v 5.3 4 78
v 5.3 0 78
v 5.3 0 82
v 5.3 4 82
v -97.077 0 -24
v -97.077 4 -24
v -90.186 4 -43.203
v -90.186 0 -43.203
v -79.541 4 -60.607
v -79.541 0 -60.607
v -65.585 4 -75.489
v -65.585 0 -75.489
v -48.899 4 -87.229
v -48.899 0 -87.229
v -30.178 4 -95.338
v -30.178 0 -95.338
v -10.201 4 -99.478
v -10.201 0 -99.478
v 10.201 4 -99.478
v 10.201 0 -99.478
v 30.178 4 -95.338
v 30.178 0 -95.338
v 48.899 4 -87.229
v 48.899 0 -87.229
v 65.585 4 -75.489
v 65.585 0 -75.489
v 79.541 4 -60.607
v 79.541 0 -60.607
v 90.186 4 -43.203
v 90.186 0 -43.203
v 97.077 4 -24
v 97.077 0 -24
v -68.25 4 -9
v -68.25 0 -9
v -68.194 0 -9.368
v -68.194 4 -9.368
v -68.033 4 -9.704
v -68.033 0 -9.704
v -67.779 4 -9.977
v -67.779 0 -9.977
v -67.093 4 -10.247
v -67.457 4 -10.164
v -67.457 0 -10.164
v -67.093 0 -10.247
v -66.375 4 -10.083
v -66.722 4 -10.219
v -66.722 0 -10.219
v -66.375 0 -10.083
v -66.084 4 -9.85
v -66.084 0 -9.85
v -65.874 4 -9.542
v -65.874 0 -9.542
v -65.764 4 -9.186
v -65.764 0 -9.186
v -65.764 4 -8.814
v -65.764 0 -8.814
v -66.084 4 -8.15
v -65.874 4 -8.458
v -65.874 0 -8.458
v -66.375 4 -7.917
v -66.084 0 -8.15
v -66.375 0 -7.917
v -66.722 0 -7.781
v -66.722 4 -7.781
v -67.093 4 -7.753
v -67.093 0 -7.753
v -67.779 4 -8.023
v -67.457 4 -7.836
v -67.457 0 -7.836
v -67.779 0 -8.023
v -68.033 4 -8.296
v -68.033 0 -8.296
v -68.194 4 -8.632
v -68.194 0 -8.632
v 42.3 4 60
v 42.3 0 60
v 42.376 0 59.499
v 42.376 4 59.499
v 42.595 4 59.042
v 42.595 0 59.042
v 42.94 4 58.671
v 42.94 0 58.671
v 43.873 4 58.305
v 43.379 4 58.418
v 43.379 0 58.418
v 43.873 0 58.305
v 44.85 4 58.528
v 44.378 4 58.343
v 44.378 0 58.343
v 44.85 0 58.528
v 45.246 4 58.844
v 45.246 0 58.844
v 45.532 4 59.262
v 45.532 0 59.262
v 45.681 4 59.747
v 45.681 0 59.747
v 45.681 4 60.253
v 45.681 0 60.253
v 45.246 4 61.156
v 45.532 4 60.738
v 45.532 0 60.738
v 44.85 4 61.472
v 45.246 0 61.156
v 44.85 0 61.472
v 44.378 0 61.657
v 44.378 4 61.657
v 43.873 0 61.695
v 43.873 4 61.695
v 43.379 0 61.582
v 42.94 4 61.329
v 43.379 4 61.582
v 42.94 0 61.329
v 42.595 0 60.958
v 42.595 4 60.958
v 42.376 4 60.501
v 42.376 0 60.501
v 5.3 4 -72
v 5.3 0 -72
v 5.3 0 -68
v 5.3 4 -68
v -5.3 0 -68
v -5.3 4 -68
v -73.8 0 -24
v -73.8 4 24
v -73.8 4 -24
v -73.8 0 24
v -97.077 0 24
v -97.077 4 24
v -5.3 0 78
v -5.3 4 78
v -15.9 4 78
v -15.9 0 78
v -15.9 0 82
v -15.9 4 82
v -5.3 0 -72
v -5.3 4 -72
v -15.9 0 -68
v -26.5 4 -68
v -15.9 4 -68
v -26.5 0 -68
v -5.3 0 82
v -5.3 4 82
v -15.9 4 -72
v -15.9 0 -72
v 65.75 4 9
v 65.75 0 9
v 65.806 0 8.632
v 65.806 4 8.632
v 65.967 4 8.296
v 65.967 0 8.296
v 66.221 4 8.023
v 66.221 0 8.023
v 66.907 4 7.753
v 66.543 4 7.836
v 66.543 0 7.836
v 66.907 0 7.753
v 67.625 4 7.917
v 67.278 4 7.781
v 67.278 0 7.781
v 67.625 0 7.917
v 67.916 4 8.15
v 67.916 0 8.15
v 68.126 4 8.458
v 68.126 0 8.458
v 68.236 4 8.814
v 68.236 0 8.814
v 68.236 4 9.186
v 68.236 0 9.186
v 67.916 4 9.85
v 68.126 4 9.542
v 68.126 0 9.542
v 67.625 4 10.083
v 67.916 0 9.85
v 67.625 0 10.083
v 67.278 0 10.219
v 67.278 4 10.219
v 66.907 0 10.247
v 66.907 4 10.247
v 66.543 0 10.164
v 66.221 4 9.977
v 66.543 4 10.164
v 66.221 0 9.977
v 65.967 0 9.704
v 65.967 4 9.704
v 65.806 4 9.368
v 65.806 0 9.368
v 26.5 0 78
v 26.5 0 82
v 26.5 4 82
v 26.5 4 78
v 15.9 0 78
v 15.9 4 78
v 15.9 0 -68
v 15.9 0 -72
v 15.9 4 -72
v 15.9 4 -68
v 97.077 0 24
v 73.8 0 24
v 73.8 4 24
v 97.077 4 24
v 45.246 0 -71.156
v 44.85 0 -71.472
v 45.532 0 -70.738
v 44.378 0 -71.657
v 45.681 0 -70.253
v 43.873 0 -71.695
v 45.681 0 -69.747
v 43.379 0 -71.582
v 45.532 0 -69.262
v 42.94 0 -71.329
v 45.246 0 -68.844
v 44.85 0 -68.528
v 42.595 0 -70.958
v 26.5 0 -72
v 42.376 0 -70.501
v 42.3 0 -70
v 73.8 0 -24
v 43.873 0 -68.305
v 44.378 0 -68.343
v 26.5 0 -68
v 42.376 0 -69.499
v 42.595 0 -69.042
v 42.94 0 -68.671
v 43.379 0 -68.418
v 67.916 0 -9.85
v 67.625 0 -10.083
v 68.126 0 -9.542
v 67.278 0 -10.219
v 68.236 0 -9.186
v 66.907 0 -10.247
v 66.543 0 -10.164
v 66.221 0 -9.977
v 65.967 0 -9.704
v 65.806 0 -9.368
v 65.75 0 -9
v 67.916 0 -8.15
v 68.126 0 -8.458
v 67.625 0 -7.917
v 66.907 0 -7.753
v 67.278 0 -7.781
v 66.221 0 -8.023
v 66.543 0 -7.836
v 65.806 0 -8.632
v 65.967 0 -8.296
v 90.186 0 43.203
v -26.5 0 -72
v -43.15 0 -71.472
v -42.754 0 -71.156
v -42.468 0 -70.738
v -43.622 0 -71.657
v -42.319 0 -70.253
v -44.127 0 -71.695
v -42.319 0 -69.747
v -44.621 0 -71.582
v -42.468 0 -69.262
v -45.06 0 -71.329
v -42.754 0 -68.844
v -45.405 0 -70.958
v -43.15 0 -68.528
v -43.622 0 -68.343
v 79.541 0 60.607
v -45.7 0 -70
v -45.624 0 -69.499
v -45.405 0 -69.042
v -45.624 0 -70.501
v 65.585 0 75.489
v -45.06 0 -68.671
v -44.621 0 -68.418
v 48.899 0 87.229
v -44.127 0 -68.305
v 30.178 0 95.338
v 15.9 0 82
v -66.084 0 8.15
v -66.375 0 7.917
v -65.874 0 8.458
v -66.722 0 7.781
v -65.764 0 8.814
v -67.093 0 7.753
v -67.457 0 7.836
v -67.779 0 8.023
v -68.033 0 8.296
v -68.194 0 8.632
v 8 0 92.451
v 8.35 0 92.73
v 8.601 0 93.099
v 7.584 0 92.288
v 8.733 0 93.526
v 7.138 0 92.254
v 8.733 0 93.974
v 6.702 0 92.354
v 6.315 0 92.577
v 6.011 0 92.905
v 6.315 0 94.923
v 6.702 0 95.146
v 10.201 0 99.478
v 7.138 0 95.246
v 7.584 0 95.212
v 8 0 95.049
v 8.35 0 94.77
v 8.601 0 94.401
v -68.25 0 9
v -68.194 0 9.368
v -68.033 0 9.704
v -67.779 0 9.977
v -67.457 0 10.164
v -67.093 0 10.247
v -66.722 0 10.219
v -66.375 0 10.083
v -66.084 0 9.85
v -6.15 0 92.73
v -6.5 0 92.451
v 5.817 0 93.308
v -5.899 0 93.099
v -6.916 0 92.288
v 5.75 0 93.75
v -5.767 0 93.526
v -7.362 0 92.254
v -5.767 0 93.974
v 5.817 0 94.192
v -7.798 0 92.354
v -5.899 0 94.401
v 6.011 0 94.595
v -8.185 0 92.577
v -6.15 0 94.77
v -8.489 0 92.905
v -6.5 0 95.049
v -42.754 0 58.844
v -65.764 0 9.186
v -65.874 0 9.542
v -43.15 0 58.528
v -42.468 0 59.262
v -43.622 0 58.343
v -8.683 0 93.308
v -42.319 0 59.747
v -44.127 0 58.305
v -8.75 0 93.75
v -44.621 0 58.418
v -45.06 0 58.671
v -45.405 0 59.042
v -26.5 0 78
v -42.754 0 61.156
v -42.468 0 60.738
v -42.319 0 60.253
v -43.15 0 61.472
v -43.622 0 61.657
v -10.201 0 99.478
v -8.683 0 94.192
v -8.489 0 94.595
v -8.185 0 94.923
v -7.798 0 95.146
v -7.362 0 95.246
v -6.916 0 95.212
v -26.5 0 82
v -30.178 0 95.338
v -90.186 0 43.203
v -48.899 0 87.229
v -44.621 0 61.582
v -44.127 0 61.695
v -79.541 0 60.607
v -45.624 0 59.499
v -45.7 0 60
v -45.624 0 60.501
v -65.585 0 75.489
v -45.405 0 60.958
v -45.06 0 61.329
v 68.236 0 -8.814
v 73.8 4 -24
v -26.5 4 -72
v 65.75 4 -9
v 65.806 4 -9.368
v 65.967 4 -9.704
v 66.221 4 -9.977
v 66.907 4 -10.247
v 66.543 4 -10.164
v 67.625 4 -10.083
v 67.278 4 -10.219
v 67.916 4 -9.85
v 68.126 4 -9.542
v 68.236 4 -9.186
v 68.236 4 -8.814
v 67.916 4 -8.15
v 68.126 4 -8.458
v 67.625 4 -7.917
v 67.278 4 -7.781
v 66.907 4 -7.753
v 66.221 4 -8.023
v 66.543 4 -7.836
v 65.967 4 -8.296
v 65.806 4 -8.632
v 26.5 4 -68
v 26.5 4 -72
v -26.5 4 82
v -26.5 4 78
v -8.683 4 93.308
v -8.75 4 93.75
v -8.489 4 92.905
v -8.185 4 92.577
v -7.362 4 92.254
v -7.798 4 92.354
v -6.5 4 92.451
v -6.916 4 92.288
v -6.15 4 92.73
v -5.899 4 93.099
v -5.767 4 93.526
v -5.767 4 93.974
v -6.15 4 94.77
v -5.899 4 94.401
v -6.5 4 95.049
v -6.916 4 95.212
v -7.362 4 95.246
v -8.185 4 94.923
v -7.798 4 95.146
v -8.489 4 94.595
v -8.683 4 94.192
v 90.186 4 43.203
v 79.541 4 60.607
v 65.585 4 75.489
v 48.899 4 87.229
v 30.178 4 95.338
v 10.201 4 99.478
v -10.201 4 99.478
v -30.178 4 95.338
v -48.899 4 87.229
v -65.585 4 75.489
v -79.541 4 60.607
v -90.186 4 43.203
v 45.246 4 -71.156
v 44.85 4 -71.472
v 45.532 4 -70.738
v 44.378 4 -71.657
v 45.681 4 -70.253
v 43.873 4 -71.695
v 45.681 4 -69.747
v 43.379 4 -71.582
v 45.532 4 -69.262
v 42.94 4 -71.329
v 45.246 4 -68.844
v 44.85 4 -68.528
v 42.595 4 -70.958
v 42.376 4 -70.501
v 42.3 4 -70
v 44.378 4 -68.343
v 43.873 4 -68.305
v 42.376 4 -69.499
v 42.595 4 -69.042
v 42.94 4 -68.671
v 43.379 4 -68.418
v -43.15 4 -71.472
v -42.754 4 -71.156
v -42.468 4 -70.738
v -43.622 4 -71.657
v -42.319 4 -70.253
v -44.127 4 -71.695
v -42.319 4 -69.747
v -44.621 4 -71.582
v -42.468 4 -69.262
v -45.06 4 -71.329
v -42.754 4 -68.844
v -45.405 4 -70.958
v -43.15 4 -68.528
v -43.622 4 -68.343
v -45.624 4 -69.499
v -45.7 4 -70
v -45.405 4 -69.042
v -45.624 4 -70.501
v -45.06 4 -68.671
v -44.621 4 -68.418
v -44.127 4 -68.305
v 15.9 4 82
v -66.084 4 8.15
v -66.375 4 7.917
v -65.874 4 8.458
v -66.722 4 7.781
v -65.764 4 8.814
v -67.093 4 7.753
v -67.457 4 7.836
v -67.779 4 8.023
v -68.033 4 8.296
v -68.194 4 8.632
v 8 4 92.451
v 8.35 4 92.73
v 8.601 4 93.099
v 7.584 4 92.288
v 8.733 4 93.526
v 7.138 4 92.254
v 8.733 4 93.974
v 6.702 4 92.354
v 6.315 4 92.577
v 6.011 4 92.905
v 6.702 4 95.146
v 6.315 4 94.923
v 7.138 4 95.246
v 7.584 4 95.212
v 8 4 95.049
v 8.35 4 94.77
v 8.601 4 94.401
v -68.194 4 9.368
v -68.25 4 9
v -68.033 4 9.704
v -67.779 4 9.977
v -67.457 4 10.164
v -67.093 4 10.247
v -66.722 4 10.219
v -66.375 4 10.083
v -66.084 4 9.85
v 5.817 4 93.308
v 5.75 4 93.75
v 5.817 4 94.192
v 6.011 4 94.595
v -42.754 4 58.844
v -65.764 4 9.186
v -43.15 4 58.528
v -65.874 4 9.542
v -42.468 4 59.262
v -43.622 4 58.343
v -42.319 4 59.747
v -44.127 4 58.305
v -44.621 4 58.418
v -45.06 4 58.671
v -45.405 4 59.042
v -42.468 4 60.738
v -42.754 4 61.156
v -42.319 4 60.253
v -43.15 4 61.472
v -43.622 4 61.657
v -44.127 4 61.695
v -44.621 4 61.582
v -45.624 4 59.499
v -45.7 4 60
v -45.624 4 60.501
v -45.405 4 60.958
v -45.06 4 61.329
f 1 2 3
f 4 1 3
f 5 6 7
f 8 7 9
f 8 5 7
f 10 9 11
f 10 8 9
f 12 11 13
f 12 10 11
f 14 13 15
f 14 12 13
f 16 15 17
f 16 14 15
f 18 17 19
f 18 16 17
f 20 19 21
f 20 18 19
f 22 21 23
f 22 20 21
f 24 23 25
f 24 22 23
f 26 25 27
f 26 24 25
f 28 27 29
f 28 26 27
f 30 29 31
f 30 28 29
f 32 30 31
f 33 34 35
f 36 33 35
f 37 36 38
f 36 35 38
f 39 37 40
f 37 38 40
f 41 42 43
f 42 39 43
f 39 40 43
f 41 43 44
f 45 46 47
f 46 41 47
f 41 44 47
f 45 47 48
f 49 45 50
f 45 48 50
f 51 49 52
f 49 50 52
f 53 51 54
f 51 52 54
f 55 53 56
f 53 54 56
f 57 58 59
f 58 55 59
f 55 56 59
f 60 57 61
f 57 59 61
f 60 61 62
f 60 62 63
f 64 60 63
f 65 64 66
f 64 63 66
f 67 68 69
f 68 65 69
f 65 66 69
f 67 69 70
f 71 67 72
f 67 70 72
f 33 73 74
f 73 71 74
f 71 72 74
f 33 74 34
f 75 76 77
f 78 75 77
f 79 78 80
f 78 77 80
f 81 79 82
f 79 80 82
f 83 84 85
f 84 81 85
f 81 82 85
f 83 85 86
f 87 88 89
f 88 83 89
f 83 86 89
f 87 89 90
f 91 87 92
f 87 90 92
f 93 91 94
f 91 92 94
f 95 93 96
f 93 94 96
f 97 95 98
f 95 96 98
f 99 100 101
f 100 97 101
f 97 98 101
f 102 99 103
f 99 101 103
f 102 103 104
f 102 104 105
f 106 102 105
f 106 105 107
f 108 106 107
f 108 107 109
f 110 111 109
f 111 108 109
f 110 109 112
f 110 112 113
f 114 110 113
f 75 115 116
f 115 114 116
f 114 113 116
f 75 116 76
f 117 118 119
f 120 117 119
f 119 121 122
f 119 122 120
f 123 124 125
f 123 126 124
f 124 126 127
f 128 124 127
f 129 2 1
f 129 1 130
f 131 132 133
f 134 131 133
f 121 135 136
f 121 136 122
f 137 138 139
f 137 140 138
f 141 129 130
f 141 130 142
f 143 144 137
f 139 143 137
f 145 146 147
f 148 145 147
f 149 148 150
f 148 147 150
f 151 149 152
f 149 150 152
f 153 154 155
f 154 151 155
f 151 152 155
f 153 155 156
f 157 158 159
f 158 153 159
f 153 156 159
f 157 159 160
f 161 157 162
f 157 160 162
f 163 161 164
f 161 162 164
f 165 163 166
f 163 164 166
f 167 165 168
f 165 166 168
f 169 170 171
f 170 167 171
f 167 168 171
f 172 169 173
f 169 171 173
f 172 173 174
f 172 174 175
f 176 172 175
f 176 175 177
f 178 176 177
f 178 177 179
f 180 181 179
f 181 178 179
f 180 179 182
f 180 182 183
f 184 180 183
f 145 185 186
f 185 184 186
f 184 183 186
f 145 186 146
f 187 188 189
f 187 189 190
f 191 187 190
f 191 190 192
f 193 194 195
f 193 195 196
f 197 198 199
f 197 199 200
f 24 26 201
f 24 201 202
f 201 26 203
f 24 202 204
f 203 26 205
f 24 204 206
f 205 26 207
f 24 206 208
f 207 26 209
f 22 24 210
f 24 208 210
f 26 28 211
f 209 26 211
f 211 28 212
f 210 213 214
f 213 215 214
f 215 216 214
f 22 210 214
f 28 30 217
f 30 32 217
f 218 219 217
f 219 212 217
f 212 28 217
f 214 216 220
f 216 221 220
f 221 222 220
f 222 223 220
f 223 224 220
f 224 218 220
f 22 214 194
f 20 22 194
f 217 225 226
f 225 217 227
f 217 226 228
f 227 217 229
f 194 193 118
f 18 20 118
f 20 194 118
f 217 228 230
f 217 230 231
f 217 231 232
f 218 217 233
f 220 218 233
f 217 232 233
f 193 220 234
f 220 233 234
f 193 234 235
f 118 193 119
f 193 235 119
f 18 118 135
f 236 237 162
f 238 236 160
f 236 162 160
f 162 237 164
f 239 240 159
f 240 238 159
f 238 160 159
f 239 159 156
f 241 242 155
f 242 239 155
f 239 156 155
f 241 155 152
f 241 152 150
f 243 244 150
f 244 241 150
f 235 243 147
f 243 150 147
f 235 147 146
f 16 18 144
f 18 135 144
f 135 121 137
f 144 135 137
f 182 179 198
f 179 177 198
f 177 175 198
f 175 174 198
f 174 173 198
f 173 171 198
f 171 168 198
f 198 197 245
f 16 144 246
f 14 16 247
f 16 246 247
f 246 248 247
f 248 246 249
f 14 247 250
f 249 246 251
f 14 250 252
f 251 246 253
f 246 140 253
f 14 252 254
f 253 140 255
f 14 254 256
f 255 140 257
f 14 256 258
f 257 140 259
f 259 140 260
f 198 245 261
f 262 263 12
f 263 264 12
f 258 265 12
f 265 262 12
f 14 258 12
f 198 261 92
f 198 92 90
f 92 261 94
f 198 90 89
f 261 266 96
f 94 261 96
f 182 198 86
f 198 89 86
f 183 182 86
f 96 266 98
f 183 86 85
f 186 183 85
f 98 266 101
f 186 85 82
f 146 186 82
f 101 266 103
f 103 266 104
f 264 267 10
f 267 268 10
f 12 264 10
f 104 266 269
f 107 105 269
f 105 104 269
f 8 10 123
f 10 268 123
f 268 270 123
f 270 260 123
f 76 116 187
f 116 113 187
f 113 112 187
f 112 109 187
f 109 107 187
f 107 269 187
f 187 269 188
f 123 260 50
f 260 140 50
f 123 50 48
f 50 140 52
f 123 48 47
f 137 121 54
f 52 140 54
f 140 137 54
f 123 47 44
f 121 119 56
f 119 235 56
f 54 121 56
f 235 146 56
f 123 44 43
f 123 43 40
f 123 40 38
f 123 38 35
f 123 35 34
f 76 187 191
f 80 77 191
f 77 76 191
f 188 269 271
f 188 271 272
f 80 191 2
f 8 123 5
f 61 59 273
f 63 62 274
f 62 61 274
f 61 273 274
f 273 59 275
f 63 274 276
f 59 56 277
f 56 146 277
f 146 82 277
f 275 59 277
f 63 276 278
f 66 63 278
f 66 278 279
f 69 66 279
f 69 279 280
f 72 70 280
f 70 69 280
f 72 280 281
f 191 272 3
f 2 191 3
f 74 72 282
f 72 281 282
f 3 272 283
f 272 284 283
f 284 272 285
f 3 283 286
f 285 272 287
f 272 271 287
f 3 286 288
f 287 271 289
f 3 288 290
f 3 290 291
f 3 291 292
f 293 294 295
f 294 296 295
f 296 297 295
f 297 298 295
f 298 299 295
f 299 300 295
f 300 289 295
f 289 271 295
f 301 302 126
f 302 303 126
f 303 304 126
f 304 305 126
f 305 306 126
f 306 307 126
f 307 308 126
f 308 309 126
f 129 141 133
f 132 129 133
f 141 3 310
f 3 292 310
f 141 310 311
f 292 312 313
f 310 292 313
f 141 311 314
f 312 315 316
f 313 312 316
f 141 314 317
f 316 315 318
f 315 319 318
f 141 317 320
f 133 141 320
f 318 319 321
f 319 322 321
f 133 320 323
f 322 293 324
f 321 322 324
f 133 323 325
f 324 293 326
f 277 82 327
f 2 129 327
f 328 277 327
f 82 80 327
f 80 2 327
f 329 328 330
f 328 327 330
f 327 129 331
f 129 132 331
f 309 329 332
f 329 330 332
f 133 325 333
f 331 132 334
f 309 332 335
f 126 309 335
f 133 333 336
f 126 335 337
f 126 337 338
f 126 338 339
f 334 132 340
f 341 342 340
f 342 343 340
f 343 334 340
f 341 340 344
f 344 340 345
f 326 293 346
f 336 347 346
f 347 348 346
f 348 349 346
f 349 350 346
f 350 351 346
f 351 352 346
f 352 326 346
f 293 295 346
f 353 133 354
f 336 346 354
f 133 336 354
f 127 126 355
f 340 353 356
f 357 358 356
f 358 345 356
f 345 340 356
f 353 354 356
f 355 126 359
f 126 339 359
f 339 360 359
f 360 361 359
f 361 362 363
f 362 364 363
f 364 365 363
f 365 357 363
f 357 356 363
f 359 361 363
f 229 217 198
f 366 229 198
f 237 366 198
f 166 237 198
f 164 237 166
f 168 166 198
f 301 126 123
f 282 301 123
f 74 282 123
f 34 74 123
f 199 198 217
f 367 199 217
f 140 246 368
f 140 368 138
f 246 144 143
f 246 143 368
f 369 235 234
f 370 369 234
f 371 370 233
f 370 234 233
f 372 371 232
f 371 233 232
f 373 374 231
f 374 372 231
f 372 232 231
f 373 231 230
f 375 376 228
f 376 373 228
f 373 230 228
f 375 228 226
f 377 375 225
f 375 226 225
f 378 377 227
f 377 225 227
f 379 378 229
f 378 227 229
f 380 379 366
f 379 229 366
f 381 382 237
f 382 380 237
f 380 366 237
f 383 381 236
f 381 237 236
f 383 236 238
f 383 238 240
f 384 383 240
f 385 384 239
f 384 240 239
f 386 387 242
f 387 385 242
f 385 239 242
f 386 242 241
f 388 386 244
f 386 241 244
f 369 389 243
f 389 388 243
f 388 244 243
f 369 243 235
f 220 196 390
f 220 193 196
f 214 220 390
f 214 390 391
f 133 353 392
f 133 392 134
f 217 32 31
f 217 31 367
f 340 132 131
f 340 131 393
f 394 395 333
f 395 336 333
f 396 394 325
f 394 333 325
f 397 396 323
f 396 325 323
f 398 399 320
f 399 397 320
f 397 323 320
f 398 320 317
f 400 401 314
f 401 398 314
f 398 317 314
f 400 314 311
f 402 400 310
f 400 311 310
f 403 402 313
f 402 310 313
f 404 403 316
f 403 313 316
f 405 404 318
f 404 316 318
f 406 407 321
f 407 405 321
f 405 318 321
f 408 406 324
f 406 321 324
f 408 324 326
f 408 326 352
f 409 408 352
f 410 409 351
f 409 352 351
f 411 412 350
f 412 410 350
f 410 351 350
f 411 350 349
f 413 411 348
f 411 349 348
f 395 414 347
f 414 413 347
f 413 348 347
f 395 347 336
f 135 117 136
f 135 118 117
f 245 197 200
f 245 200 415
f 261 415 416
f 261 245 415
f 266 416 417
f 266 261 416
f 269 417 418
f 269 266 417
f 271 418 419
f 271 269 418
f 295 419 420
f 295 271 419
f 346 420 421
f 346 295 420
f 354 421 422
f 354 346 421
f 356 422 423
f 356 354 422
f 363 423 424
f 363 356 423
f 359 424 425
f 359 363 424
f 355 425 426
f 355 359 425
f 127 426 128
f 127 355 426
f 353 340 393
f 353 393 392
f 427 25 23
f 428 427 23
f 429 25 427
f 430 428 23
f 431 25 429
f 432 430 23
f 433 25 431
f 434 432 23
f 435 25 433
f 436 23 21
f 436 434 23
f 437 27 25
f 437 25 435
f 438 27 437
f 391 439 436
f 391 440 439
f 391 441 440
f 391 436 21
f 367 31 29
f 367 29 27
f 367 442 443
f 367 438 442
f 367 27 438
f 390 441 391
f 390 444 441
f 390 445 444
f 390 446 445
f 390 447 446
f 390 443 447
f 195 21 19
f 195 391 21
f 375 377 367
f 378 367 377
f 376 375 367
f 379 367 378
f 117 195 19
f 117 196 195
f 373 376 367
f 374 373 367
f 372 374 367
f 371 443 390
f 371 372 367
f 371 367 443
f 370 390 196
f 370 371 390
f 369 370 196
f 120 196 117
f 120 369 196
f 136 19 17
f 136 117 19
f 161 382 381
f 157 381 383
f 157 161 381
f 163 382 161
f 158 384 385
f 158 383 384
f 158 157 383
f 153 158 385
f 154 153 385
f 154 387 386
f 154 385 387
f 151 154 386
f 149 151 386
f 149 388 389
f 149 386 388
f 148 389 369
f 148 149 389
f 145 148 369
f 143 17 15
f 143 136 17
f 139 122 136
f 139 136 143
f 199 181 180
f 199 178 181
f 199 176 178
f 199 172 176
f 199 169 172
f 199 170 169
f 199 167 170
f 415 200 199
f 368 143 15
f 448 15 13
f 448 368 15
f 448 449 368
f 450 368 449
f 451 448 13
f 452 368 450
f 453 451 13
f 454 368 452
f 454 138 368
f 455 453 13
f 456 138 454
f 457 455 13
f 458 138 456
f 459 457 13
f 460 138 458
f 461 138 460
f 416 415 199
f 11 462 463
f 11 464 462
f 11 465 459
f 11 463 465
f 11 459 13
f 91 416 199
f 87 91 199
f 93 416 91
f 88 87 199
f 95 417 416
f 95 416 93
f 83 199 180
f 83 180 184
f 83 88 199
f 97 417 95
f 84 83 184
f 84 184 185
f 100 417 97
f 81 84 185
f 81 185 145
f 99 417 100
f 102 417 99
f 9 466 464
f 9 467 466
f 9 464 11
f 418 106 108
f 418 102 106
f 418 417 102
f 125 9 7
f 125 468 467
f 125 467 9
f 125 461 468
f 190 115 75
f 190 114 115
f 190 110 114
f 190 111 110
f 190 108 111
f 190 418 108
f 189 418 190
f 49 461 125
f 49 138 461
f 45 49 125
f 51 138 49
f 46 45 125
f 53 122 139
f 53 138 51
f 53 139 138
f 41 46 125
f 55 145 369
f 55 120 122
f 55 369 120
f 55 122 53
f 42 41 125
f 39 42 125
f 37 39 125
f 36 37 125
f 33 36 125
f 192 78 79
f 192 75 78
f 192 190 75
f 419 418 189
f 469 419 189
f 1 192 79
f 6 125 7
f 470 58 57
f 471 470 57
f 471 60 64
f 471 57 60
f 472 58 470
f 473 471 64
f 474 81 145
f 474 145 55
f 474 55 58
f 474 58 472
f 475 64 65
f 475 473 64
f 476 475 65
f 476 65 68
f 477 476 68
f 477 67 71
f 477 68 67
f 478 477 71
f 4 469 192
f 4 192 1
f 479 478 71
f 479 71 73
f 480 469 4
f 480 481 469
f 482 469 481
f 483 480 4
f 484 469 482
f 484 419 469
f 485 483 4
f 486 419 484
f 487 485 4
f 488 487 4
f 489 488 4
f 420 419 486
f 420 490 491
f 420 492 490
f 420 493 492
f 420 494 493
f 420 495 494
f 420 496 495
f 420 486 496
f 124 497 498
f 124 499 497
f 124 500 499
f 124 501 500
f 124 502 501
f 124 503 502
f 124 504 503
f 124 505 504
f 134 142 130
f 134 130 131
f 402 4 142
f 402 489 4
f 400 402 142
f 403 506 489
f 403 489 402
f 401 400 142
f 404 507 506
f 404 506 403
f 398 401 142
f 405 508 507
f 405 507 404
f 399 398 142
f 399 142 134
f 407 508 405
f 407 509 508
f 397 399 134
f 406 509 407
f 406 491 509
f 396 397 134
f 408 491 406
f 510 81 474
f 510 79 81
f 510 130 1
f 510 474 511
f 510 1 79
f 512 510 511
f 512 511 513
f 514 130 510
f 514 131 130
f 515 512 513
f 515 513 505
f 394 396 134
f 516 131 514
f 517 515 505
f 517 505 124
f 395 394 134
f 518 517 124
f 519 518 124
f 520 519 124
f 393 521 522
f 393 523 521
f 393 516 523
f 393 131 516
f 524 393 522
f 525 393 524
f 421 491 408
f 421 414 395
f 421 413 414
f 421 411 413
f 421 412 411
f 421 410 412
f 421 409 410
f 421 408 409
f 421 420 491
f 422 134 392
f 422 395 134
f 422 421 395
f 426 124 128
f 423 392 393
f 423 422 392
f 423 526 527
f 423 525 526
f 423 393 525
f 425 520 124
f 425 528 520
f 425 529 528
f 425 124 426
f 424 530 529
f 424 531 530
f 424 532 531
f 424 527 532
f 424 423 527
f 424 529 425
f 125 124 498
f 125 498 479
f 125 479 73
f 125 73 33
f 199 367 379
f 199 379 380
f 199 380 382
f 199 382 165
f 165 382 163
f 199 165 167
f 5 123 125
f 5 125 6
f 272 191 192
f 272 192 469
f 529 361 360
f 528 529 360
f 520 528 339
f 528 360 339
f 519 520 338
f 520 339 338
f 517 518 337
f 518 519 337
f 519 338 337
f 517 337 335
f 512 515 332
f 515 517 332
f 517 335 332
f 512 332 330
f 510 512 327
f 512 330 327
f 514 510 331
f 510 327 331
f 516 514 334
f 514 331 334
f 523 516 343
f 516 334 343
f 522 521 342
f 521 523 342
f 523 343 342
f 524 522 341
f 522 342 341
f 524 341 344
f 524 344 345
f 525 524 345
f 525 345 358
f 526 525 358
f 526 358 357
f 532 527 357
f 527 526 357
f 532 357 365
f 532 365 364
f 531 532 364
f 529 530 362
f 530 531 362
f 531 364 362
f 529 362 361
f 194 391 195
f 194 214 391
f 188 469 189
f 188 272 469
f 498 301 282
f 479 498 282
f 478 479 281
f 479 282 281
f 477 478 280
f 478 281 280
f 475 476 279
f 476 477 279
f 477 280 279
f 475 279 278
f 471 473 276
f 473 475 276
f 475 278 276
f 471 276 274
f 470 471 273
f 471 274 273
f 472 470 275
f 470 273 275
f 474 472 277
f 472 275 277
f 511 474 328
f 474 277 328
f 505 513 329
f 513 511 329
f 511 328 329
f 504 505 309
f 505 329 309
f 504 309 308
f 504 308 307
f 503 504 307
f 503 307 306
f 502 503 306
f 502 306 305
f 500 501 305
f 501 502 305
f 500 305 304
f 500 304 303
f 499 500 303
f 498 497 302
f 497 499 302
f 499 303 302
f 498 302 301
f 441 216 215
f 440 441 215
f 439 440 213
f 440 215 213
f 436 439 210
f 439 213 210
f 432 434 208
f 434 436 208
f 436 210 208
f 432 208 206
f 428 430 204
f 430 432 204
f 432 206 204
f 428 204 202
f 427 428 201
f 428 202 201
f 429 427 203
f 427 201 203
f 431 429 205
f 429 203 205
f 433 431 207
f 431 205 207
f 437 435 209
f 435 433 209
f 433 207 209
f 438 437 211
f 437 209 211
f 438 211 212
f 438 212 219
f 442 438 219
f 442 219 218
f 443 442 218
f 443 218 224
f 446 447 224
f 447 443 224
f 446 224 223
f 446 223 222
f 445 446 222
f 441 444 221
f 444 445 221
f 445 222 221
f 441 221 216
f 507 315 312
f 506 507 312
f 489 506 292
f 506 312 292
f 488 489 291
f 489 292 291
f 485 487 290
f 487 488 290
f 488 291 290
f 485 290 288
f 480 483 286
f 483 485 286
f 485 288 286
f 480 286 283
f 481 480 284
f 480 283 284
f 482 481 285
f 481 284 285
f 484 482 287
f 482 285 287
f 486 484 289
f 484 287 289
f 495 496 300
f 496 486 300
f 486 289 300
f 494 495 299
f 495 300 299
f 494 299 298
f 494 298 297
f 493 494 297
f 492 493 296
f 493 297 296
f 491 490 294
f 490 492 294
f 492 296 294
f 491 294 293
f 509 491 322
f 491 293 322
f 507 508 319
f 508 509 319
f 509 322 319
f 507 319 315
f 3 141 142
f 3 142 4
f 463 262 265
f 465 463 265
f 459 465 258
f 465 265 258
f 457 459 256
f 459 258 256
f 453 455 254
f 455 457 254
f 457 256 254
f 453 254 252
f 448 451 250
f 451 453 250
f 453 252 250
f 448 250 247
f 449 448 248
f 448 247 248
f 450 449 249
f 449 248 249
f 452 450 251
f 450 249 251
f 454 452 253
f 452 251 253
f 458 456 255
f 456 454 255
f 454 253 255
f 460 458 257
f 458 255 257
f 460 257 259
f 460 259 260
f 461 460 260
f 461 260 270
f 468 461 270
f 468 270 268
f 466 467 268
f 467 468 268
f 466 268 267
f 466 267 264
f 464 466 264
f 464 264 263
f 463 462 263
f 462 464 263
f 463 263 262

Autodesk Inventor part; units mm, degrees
ref_plane "YZ Plane" through (0, 0, 0) normal (1, 0, 0) x (0, 1, 0)
ref_plane "XZ Plane" through (0, 0, 0) normal (0, 1, 0) x (-1, 0, 0)
ref_plane "XY Plane" through (0, 0, 0) normal (0, 0, 1) x (1, 0, 0)
sketch "Sketch1" plane through (0, 0, 0) normal (0, 1, 0) x (-1, 0, 0)
  circle A0 centre (0, 0) radius 100
  line L0 (0, -140) -> (0, 140) projected
  line L1 (-146.2506, 0) -> (146.2506, 0) projected
  circle A1 centre (7.25, 93.75) radius 1.5
  circle A2 centre (-7.25, 93.75) radius 1.5
  circle A3 centre (-44, 60) radius 1.7
  circle A4 centre (-44, -70) radius 1.7
  circle A5 centre (44, 60) radius 1.7
  circle A6 centre (44, -70) radius 1.7
  circle A7 centre (-67, 9) radius 1.25
  circle A8 centre (-67, -9) radius 1.25
  circle A9 centre (67, 9) radius 1.25
  circle A10 centre (67, -9) radius 1.25
  line L2 (-95.8, 24) -> (-73.8, 24)
  line L3 (-73.8, 24) -> (-73.8, -24)
  line L4 (-73.8, -24) -> (-95.8, -24)
  line L5 (-95.8, -24) -> (-95.8, 24)
  line L6 (-95.8, 24) -> (-104.4647, 24)
  line L7 (-104.4647, 24) -> (-104.4647, -24)
  line L8 (-104.4647, -24) -> (-95.8, -24)
  line L9 (-95.8, -24) -> (-95.8, 24)
  line L10 (95.8, 24) -> (73.8, 24)
  line L11 (73.8, 24) -> (73.8, -24)
  line L12 (73.8, -24) -> (95.8, -24)
  line L13 (95.8, -24) -> (95.8, 24)
  line L14 (95.8, 24) -> (104.4647, 24)
  line L15 (104.4647, 24) -> (104.4647, -24)
  line L16 (104.4647, -24) -> (95.8, -24)
  line L17 (95.8, -24) -> (95.8, 24)
  line L18 (-26.5, 78) -> (26.5, 78)
  line L19 (26.5, 78) -> (26.5, 82)
  line L20 (26.5, 82) -> (-26.5, 82)
  line L21 (-26.5, 82) -> (-26.5, 78)
  line L22 (-26.5, 78) -> (-15.9, 78)
  line L23 (-15.9, 78) -> (-15.9, 82)
  line L24 (-15.9, 82) -> (-26.5, 82)
  line L25 (-26.5, 82) -> (-26.5, 78)
  line L26 (-5.3, 78) -> (-5.3, 82)
  line L27 (5.3, 78) -> (5.3, 82)
  line L28 (15.9, 78) -> (15.9, 82)
  line L29 (-26.5, -72) -> (26.5, -72)
  line L30 (26.5, -68) -> (-26.5, -68)
  line L31 (15.9, -72) -> (15.9, -68)
  line L32 (26.5, -72) -> (26.5, -68)
  line L33 (5.3, -72) -> (5.3, -68)
  line L34 (-5.3, -72) -> (-5.3, -68)
  line L35 (-15.9, -72) -> (-15.9, -68)
  line L36 (-26.5, -68) -> (-26.5, -72)
  point P0 (97.0773, 24)
  point P1 (-97.0773, 24)
  point P2 (-97.0773, -24)
  point P3 (97.0773, -24)
  dimension "diam" = 200
  dimension "d3" = 7.25
  dimension "d4" = 7.25
  dimension "d5" = 93.75
  dimension "d6" = 93.75
  dimension "d7" = 3
  dimension "d8" = 3
  dimension "d9" = 60
  dimension "d10" = 3.4
  dimension "d13" = 130
  dimension "d16" = 88
  dimension "d19" = 44
  dimension "d20" = 67
  dimension "d21" = 9
  dimension "d22" = 2.5
  dimension "d25" = 18
  dimension "d28" = 134
  dimension "d31" = 95.8
  dimension "d32" = 24
  dimension "d33" = 22
  dimension "d34" = 48
  dimension "d35" = 78
  dimension "d36" = 26.5
  dimension "d37" = 53
  dimension "d38" = 4
  dimension "d39" = 10.6
  dimension "d40" = 4
  dimension "d43" = 10.6
  dimension "d50" = 150
  dimension "d55" = 0
extrude "Extrusion1" add sketch "Sketch1" along normal blind 4 contours L14 L10 L11 L1 L0 L18 L19 L20 A0 | A0 L0 L29 L32 L30 L1 L11 L12 L16 | L0 L20 L21 L18 L1 L3 L2 L6 A0 | A0 L8 L4 L3 L1 L0 L30 L36 L29 | L20 L28 L18 L27 | L26 L18 L23 L20 | L29 L35 L30 L34 | L33 L30 L31 L29
sketch "Sketch2" plane through (0, 4, 0) normal (0, 1, 0) x (1, 0, 0)
  line L0 (-97.0773, 24) -> (-73.8, 24) projected
  line L1 (-73.8, 24) -> (-73.8, -24) projected
  line L2 (-73.8, -24) -> (-97.0773, -24) projected
  arc A0 (-97.0773, -24) -> (97.0773, -24) centre (0, 0) ccw projected
  line L3 (97.0773, -24) -> (73.8, -24) projected
  line L4 (73.8, -24) -> (73.8, 24) projected
  line L5 (73.8, 24) -> (97.0773, 24) projected
  arc A1 (97.0773, 24) -> (-97.0773, 24) centre (0, 0) ccw projected
  line L6 (15.9, -78) -> (26.5, -78) projected
  line L7 (26.5, -78) -> (26.5, -82) projected
  line L8 (26.5, -82) -> (15.9, -82) projected
  line L9 (15.9, -82) -> (15.9, -78) projected
  line L10 (5.3, 68) -> (-5.3, 68) projected
  line L11 (-5.3, 68) -> (-5.3, 72) projected
  line L12 (-5.3, 72) -> (5.3, 72) projected
  line L13 (5.3, 72) -> (5.3, 68) projected
  line L14 (15.9, 68) -> (15.9, 72) projected
  line L15 (15.9, 72) -> (26.5, 72) projected
  line L16 (26.5, 72) -> (26.5, 68) projected
  line L17 (26.5, 68) -> (15.9, 68) projected
  circle A2 centre (67, 9) radius 1.25 projected
  circle A3 centre (44, 70) radius 1.7 projected
  circle A4 centre (-44, 70) radius 1.7 projected
  circle A5 centre (-67, 9) radius 1.25 projected
  line L18 (-15.9, 72) -> (-15.9, 68) projected
  line L19 (-15.9, 68) -> (-26.5, 68) projected
  line L20 (-26.5, 68) -> (-26.5, 72) projected
  line L21 (-26.5, 72) -> (-15.9, 72) projected
  line L22 (5.3, -78) -> (5.3, -82) projected
  line L23 (5.3, -82) -> (-5.3, -82) projected
  line L24 (-5.3, -82) -> (-5.3, -78) projected
  line L25 (-5.3, -78) -> (5.3, -78) projected
  circle A6 centre (67, -9) radius 1.25 projected
  circle A7 centre (44, -60) radius 1.7 projected
  circle A8 centre (7.25, -93.75) radius 1.5 projected
  line L26 (-15.9, -78) -> (-15.9, -82) projected
  line L27 (-15.9, -82) -> (-26.5, -82) projected
  line L28 (-26.5, -82) -> (-26.5, -78) projected
  line L29 (-26.5, -78) -> (-15.9, -78) projected
  circle A9 centre (-67, -9) radius 1.25 projected
  circle A10 centre (-44, -60) radius 1.7 projected
  circle A11 centre (-7.25, -93.75) radius 1.5 projected
equation "\"d3\" = 0.5 * caster_dist_holes"
equation "\"d4\" = d3"
equation "\"d6\" = d5"
equation "\"d19\" = 0.5 * d16"
equation "\"d25\" = 2 * d21"
equation "\"d28\" = 2 * d20"
equation "\"d34\" = 2 * d32"
equation "\"d39\" = 0.2 * d37"
equation "\"d43\" = d39"
equation "\"caster_dist_holes\" = 14.5"
properties part number "base" material "MDF Medium Density Fiberboard"
